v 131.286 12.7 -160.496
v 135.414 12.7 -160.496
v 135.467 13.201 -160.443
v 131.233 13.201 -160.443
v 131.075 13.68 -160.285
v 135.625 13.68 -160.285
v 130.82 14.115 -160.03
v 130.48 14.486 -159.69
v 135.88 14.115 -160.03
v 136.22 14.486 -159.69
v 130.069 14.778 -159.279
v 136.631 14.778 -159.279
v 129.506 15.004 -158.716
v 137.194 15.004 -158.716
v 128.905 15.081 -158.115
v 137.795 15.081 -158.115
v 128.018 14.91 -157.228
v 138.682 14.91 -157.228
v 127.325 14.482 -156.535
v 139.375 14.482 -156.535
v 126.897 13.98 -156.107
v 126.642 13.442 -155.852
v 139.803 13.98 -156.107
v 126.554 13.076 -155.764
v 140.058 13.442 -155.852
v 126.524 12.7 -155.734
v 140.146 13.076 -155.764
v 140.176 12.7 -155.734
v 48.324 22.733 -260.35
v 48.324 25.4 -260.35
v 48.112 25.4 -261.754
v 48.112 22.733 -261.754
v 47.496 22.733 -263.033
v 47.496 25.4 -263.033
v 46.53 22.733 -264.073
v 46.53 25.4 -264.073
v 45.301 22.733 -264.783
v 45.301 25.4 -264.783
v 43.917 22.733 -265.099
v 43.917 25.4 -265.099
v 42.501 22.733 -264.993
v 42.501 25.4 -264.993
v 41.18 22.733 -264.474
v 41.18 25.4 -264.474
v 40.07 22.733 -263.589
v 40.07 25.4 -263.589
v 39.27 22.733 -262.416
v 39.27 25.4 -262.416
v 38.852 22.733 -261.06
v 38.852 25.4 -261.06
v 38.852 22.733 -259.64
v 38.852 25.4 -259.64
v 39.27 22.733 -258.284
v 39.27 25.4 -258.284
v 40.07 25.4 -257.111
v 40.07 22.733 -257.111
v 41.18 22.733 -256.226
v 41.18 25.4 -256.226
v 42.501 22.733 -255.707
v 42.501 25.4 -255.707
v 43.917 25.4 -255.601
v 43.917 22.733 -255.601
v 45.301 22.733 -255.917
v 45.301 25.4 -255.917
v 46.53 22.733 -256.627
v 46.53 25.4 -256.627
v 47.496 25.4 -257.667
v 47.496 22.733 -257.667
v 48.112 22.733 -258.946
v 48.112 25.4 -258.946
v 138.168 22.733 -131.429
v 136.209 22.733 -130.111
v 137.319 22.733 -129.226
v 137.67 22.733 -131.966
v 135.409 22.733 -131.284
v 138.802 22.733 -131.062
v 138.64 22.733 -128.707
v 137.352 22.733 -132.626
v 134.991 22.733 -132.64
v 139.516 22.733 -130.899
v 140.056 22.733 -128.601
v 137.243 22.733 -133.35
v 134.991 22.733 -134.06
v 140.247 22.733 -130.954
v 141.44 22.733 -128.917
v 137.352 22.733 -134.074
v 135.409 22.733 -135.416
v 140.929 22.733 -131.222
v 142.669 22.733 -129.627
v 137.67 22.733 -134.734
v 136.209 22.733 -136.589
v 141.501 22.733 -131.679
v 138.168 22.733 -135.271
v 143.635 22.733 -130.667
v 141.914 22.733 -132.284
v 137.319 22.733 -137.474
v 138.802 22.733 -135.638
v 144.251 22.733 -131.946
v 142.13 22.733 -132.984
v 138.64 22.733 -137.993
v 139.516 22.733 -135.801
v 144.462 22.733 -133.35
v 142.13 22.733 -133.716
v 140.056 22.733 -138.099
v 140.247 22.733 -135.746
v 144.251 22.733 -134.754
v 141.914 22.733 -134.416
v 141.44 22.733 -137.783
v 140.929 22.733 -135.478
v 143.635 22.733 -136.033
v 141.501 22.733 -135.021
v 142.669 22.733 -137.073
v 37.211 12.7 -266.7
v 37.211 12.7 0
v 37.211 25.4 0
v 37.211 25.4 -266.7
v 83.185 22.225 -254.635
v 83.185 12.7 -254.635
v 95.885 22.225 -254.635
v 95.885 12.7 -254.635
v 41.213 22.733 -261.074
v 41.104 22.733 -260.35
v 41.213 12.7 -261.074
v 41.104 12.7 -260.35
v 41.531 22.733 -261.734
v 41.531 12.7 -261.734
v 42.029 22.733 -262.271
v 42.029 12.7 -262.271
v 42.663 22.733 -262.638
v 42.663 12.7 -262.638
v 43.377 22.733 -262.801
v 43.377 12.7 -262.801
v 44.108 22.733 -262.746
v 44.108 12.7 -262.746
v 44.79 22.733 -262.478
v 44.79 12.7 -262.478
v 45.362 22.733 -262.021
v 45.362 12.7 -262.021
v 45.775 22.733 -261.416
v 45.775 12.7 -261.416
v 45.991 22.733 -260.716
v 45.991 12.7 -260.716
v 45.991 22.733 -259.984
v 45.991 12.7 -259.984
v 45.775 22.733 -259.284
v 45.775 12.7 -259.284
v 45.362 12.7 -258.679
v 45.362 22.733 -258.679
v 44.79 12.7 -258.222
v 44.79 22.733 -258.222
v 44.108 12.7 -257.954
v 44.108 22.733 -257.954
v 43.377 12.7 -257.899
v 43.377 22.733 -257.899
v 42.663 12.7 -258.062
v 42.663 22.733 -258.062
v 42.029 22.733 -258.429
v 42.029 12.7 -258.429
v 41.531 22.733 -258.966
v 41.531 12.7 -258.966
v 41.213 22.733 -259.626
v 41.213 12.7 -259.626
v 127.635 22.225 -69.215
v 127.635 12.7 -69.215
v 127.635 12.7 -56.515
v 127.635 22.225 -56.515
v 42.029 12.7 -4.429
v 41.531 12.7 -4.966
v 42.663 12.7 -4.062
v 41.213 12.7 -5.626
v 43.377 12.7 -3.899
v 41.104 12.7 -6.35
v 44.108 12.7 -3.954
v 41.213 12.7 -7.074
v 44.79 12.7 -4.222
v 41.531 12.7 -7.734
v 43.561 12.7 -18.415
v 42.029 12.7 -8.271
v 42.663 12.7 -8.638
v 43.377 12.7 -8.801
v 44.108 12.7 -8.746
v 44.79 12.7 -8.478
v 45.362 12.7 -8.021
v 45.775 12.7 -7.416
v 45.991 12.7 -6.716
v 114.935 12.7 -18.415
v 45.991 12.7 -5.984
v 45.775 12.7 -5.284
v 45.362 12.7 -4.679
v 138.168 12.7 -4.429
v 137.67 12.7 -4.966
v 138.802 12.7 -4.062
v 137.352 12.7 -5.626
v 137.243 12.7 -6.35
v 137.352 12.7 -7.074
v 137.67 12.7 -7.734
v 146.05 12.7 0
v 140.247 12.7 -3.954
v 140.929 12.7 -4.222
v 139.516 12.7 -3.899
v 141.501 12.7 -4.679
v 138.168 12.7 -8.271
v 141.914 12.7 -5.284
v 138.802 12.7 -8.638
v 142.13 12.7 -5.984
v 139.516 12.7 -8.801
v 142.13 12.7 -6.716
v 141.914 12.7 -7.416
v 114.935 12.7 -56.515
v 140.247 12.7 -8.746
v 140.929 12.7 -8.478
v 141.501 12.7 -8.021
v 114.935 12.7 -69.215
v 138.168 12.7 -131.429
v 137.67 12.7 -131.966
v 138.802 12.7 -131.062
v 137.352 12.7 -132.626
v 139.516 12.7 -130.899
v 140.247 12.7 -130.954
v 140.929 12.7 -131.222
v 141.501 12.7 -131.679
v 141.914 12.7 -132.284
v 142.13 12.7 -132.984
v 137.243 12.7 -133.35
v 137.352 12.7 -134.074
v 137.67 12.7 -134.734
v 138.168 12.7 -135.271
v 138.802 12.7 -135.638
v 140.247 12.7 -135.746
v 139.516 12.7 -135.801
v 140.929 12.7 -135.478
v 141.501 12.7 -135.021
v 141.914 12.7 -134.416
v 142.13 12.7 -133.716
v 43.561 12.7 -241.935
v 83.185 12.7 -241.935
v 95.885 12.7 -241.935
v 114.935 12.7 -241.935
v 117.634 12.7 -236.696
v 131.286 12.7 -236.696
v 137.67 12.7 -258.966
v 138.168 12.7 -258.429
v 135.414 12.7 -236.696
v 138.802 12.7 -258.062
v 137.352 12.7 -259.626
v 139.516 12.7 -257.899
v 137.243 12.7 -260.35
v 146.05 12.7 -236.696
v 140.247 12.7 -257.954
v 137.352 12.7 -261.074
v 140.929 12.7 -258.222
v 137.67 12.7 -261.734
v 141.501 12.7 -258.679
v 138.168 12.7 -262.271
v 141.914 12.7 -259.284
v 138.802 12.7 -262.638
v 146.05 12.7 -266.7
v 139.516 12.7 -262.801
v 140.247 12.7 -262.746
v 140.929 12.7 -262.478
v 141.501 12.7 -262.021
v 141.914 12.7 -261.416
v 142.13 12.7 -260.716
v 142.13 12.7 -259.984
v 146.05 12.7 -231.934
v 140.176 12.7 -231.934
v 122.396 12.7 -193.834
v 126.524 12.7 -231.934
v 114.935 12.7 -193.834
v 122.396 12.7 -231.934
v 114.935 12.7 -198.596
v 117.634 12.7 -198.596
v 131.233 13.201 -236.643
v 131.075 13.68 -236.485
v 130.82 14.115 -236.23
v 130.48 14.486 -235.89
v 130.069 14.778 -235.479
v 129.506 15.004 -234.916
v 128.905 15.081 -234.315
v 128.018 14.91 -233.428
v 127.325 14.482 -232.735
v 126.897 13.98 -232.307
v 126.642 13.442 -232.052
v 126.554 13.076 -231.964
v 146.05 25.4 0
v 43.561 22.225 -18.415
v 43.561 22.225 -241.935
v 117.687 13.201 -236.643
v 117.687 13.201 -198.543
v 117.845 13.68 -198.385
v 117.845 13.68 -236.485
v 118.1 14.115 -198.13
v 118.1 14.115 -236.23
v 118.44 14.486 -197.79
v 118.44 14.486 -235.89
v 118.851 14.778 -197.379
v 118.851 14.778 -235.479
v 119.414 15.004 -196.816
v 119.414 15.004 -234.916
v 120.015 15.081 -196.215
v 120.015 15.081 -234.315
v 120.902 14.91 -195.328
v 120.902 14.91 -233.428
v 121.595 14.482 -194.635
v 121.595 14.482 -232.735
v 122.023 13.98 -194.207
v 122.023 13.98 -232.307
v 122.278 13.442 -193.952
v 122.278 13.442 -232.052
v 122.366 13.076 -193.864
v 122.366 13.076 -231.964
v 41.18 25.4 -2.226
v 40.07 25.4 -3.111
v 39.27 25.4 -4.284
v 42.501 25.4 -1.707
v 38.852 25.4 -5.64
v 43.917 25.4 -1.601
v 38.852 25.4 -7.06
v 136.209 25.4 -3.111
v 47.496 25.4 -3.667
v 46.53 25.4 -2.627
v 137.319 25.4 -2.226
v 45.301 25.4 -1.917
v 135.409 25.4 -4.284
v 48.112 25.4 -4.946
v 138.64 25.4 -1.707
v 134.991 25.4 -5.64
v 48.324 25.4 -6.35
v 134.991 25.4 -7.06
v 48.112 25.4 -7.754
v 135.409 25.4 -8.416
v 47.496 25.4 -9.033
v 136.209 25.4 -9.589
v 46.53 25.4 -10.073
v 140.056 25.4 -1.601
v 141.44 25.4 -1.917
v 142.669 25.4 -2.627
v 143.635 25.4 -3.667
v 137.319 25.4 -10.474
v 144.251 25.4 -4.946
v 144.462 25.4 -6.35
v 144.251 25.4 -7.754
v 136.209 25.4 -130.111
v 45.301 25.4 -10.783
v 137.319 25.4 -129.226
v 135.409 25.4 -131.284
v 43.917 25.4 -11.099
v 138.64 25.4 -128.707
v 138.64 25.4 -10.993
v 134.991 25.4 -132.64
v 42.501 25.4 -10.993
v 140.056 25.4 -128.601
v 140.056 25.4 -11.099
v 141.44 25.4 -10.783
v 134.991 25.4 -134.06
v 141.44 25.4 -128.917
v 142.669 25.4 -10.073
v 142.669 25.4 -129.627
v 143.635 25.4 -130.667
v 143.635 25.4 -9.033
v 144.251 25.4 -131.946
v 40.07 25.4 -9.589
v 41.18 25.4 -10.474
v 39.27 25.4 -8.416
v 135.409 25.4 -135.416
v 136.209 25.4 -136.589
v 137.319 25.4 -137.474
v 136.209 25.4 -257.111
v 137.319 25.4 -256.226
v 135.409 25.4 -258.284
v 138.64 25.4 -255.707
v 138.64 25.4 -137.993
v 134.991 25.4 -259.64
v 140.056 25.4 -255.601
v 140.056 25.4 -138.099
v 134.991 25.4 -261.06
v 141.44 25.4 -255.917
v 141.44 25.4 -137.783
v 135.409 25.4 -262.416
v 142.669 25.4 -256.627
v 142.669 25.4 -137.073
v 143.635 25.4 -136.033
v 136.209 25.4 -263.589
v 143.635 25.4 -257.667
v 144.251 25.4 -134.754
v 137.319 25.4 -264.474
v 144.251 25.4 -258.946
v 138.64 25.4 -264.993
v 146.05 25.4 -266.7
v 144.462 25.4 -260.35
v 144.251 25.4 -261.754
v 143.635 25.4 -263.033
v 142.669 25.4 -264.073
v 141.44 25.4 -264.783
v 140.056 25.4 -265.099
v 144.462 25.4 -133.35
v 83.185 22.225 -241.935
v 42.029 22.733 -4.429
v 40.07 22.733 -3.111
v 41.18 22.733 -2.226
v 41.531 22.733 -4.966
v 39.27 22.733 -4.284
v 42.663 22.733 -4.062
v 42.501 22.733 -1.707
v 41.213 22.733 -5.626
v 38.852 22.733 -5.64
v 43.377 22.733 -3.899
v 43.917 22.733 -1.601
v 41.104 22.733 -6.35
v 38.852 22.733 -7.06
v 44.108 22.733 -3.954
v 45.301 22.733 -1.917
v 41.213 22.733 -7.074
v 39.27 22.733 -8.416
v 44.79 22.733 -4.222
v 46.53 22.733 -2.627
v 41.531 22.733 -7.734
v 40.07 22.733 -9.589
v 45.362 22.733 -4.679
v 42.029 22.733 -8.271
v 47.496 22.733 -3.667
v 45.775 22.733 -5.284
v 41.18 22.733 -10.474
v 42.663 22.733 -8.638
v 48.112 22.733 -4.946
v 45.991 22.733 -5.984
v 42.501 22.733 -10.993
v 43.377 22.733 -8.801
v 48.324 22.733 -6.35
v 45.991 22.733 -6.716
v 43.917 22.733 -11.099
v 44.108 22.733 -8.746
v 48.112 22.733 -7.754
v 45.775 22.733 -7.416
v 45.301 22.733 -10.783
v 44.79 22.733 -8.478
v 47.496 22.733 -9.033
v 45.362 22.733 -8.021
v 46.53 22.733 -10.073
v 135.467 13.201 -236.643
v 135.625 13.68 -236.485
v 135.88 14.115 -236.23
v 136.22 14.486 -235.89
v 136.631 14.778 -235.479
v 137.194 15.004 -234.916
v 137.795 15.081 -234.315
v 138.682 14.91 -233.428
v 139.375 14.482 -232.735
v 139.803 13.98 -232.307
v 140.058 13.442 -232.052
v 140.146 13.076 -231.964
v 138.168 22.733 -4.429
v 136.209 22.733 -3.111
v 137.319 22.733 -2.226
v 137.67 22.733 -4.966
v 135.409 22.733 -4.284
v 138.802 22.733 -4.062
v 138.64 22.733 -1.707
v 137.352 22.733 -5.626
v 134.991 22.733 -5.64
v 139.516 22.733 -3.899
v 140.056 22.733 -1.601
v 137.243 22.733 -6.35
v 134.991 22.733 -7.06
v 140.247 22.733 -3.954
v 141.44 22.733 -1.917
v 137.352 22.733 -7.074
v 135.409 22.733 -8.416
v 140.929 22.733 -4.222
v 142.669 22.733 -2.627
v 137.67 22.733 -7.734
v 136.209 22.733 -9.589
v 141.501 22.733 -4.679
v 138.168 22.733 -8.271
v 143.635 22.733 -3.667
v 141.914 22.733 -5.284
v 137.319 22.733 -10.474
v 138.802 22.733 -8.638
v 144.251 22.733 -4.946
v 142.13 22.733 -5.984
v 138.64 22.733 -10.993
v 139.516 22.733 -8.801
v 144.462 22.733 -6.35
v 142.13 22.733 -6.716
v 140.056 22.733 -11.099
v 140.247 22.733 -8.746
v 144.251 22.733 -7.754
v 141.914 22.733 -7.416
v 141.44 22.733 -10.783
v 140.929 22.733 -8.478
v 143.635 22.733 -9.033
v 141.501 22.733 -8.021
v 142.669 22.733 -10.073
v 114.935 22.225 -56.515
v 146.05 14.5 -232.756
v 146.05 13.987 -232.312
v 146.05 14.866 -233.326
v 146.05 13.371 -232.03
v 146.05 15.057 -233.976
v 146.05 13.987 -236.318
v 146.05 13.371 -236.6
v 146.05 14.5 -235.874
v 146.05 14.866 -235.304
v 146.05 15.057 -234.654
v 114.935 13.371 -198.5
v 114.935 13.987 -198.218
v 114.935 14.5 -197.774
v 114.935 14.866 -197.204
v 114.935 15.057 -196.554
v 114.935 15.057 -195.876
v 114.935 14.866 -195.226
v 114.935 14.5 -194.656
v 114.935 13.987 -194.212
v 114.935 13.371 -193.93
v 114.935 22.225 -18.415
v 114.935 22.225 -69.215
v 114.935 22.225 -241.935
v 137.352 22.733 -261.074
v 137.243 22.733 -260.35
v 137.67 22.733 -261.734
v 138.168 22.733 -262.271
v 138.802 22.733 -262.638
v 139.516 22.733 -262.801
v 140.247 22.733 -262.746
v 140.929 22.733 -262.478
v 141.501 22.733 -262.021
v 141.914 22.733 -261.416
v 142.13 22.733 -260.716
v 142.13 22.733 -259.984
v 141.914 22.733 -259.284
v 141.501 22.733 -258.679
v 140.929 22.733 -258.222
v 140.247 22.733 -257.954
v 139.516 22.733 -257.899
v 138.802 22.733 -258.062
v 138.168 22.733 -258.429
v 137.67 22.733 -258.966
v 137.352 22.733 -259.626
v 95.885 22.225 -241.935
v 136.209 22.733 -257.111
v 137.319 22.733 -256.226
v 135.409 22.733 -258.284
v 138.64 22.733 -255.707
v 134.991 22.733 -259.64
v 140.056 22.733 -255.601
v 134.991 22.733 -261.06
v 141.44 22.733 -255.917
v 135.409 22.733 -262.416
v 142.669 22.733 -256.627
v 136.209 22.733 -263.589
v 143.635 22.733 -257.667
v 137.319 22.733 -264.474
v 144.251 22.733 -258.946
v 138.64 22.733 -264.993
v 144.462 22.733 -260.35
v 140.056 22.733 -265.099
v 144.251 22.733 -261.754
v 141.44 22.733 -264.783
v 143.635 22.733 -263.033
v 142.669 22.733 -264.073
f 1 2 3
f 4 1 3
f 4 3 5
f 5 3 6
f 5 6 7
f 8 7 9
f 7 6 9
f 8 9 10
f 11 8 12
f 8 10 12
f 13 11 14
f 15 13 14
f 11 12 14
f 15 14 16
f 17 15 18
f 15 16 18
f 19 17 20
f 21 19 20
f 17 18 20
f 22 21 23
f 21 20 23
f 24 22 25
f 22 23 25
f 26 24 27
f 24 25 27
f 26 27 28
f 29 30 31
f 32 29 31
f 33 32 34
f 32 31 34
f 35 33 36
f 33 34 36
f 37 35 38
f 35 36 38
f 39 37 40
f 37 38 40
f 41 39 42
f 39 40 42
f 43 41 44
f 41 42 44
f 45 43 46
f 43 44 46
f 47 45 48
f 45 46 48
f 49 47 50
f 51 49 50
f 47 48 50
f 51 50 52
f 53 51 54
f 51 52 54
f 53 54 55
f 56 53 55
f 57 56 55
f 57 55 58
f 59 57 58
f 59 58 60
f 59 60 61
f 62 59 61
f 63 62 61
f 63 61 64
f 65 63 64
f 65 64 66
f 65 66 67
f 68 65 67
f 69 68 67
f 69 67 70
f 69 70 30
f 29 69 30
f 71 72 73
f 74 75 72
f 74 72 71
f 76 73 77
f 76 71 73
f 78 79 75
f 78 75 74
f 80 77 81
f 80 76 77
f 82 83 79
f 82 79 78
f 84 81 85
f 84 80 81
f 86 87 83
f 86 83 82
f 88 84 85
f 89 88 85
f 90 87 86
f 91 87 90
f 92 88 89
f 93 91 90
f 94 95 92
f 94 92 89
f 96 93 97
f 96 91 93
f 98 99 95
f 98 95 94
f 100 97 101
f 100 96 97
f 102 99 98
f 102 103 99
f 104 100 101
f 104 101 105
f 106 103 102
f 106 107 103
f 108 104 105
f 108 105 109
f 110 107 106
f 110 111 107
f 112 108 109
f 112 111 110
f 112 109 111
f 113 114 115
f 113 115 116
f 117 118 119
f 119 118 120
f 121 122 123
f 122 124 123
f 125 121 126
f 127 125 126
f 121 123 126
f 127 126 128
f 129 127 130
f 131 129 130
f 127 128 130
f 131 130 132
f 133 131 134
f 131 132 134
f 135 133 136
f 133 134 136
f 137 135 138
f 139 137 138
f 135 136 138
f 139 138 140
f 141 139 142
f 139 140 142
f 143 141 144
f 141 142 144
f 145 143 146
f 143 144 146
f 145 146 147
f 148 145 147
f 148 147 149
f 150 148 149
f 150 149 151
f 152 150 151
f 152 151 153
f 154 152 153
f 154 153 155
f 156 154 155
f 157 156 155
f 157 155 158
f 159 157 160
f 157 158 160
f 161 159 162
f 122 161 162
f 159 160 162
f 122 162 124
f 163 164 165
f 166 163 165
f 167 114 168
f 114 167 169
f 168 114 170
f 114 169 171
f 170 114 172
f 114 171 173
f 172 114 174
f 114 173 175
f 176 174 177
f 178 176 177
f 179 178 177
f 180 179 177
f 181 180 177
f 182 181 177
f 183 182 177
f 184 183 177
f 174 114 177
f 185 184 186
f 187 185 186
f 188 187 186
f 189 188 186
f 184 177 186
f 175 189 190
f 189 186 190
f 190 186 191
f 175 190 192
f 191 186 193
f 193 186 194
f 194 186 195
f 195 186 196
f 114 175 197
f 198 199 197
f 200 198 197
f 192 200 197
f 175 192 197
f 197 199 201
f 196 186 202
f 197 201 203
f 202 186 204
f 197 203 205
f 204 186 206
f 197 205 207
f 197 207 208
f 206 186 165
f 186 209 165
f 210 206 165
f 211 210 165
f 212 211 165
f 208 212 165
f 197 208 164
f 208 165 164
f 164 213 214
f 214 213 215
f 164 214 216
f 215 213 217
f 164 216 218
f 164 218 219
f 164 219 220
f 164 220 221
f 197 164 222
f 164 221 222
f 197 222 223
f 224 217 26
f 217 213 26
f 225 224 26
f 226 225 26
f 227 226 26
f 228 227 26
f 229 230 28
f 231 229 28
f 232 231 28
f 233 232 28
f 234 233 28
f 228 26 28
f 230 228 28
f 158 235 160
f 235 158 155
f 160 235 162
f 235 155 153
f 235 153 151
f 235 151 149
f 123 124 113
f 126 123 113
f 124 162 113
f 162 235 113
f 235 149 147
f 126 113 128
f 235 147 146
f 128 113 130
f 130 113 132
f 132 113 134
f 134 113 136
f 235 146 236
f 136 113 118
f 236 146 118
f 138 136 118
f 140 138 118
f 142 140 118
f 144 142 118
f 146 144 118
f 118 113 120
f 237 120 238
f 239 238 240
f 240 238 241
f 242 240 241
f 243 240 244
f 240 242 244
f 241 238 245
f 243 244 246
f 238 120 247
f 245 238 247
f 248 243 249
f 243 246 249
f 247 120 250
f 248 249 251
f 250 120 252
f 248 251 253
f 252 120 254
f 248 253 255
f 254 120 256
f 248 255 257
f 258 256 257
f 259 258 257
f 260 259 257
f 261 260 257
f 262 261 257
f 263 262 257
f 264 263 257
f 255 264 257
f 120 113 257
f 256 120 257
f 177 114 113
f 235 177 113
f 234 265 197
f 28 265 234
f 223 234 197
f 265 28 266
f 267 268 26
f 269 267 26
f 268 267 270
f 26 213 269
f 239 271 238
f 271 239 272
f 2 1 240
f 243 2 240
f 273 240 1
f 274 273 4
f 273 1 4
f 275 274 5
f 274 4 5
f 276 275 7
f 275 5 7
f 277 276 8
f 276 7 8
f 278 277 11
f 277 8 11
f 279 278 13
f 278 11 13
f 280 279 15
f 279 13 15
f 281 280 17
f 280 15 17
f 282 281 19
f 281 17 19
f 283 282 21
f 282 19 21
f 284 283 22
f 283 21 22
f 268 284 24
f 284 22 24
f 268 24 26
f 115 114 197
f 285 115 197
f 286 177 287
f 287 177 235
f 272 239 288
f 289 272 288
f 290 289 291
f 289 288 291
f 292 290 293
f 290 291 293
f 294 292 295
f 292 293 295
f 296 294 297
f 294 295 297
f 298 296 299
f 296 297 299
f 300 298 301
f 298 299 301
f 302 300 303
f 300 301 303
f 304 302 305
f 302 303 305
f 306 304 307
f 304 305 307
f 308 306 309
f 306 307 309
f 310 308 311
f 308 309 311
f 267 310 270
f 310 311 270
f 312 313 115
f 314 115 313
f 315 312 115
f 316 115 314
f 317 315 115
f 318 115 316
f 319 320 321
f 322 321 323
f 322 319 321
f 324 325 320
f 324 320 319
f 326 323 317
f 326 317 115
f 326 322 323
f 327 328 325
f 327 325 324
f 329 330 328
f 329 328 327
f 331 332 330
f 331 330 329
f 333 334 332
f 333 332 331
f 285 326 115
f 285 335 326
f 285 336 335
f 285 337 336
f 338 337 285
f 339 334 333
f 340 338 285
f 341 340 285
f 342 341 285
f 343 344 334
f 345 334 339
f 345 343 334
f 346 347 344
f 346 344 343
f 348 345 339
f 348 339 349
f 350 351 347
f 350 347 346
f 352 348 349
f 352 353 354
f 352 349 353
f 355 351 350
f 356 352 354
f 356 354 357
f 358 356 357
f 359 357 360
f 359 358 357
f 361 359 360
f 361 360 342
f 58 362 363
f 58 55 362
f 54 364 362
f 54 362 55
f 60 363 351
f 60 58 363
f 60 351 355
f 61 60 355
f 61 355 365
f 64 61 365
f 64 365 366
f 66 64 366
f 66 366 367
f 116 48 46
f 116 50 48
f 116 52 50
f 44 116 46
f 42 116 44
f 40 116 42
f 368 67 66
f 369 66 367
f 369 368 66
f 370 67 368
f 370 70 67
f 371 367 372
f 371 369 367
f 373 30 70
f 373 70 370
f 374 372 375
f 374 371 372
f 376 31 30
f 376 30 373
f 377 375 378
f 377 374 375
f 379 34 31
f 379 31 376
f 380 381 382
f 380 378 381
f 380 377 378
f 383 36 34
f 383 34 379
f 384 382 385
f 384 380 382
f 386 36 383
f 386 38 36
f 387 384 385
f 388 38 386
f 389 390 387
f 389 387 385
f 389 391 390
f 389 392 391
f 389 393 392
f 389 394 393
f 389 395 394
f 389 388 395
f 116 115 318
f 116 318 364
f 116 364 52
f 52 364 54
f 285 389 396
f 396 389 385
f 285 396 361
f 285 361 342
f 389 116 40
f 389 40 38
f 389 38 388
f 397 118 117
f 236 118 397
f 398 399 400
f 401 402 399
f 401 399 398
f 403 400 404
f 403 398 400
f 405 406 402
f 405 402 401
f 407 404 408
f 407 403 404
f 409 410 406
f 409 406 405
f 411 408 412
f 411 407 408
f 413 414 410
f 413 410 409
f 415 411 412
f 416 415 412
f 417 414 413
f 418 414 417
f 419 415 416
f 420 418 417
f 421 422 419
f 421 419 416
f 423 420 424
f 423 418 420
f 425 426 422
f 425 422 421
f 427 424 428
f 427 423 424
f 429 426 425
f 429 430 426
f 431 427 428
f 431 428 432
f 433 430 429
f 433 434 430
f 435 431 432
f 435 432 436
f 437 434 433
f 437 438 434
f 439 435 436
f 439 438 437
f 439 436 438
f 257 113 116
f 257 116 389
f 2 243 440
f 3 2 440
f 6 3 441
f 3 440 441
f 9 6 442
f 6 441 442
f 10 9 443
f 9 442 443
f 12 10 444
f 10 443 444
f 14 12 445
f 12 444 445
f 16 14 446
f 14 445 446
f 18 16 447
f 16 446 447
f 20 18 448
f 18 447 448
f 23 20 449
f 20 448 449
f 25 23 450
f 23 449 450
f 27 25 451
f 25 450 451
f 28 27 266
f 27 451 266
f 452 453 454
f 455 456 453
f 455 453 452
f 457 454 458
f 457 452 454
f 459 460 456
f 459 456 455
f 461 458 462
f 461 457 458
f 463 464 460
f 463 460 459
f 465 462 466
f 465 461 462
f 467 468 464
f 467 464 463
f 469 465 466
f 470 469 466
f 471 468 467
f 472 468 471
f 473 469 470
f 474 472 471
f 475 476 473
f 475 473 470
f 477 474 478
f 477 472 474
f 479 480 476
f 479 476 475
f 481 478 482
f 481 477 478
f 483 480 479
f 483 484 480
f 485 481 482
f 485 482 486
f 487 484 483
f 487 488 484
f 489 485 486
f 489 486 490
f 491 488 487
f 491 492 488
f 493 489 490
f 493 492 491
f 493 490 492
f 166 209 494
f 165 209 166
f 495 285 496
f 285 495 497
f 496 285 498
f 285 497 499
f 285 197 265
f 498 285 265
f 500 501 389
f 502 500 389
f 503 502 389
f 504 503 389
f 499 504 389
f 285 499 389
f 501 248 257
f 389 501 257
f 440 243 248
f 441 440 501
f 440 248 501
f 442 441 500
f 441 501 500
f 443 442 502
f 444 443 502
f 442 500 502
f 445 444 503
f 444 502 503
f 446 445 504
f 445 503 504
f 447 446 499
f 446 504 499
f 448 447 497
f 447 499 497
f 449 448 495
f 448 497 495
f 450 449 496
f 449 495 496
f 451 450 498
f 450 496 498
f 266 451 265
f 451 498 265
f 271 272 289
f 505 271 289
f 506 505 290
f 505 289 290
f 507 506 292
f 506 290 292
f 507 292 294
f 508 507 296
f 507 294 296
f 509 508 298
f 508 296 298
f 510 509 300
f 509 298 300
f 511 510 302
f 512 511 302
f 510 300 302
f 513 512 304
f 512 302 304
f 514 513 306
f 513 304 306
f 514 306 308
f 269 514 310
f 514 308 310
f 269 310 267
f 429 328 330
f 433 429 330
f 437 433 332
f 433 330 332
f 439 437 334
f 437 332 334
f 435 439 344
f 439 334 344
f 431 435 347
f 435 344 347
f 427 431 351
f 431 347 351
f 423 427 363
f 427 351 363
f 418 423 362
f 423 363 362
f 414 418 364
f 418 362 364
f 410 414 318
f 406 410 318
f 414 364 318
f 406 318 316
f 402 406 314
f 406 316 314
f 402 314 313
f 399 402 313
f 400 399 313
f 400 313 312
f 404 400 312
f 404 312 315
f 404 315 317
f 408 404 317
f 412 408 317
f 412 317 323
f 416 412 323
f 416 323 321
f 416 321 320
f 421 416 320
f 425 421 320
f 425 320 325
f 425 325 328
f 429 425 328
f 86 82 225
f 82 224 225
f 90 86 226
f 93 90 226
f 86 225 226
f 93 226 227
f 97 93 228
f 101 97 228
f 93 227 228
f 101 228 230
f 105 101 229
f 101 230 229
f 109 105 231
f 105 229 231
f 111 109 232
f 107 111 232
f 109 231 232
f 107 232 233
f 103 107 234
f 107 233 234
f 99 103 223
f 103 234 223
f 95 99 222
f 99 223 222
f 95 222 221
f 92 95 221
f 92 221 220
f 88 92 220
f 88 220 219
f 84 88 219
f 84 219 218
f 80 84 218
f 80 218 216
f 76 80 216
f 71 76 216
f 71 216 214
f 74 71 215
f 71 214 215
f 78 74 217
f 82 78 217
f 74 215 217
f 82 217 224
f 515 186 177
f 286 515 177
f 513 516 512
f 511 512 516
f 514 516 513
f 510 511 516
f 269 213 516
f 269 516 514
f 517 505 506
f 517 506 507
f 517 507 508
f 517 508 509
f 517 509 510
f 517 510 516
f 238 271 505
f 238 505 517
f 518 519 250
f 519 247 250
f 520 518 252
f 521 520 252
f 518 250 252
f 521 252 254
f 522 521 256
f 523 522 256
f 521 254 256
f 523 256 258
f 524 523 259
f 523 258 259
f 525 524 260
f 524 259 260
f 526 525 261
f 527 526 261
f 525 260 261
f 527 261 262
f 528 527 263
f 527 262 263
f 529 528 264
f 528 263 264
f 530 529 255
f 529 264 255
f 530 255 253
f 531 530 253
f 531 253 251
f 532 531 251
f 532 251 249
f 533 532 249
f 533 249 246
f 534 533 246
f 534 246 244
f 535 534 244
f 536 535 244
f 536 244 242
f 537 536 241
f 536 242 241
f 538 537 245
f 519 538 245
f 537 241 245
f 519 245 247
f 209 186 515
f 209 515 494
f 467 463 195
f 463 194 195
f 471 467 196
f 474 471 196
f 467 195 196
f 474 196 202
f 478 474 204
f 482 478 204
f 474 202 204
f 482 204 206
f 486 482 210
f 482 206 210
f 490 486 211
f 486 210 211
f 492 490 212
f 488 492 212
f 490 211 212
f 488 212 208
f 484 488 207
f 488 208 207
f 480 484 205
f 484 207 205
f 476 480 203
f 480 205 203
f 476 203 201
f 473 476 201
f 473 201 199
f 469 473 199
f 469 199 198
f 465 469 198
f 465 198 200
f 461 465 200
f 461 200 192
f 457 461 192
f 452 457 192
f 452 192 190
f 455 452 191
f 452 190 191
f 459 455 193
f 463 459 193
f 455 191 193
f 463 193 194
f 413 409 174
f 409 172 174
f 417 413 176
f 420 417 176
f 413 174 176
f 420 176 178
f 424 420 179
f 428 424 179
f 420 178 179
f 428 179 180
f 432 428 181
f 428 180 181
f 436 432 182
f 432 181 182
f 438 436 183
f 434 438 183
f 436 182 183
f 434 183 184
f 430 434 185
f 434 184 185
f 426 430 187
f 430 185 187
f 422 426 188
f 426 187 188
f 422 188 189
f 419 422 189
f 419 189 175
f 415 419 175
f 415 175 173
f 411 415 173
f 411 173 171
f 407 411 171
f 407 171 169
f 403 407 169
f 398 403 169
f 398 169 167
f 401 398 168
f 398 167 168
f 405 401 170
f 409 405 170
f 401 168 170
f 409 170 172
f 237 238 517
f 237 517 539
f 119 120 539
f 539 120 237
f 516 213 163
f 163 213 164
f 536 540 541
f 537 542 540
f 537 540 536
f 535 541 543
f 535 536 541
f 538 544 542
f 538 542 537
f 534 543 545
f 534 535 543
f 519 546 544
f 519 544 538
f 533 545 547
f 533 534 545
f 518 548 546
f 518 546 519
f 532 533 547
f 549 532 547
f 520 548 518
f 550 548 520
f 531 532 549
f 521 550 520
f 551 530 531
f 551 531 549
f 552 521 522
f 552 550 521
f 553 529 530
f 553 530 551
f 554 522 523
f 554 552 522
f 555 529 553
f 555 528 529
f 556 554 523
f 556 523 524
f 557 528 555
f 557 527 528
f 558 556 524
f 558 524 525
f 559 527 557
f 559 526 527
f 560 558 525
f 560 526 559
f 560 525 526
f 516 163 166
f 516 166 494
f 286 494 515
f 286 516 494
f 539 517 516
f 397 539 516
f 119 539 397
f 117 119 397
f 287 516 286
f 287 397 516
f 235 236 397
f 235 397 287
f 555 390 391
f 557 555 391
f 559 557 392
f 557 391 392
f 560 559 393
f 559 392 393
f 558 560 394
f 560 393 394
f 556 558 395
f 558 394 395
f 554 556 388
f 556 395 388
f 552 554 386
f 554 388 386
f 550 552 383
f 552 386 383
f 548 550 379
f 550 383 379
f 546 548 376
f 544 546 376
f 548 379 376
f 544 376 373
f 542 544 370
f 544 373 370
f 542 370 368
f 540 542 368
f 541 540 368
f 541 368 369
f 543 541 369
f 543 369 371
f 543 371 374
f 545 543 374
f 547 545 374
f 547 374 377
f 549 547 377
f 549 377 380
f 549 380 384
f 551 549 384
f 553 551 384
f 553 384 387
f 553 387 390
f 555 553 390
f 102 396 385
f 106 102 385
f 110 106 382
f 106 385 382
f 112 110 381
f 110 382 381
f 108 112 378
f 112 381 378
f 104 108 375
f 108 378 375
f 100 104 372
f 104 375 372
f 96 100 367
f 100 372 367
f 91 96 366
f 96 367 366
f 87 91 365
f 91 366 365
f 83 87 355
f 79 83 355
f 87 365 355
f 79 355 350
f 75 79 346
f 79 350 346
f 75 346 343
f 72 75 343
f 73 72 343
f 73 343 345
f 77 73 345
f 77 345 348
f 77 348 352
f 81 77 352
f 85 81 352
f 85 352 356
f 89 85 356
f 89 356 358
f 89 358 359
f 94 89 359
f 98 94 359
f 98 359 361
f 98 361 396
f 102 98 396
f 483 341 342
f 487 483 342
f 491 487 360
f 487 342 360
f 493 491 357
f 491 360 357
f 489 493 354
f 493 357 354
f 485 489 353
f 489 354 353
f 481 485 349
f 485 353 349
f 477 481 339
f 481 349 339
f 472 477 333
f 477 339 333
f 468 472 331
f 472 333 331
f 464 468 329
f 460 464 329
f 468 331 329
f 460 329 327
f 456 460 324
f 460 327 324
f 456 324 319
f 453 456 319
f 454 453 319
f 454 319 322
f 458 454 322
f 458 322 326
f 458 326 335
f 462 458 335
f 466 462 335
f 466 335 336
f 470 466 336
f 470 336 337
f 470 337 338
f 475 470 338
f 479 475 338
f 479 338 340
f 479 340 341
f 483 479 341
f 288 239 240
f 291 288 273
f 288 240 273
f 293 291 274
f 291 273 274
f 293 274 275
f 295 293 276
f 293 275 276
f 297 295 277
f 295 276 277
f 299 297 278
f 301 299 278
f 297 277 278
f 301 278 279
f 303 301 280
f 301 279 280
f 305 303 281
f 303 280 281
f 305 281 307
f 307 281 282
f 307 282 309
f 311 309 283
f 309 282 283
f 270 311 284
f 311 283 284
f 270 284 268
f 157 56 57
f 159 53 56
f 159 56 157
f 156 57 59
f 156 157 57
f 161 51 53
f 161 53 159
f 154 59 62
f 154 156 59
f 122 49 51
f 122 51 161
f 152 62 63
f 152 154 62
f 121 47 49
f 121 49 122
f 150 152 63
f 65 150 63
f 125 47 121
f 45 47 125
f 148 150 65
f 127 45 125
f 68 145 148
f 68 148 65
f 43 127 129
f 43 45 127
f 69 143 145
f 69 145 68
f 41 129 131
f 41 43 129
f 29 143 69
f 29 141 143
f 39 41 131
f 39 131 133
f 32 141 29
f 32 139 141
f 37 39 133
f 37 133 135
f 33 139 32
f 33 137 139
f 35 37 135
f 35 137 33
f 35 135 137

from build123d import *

# Parameters (mm, degrees)
BOSS_EXTRUDE1_START                                 = 12.7
SKETCH1_W                                           = 108.839
SKETCH1_H                                           = 266.7
BOSS_EXTRUDE1_DEPTH                                 = 12.7
CBORE_FOR_8_BINDING_HEAD_MACHINE_SCREW1_D           = 4.9149
CBORE_FOR_8_BINDING_HEAD_MACHINE_SCREW1_CBORE_D     = 9.525
CBORE_FOR_8_BINDING_HEAD_MACHINE_SCREW1_CBORE_DEPTH = 2.667
SKETCH4_W                                           = 71.374
SKETCH4_H                                           = 223.52
CUT_EXTRUDE1_DEPTH                                  = 9.525
SKETCH6_R                                           = 2.38125
SKETCH8_W                                           = 12.7
SKETCH8_H                                           = 12.7
CUT_EXTRUDE3_DEPTH                                  = 9.525


with BuildPart() as part:
    # Sketch1 → Boss-Extrude1 (new body)
    with BuildSketch(Plane(origin=(0, 0, 0), x_dir=(1, 0, 0), z_dir=(0, 1, 0)).offset(BOSS_EXTRUDE1_START)):
        with Locations((91.6305, 133.35)):
            Rectangle(SKETCH1_W, SKETCH1_H)
    extrude(amount=BOSS_EXTRUDE1_DEPTH)

    # CBORE for #8 Binding Head Machine Screw1 (through all)
    with Locations(Plane(origin=(0, 25.4, 0), x_dir=(1, 0, 0), z_dir=(0, 1, 0))):
        with Locations((139.7, 6.35), (139.7, 260.35), (43.561, 6.35), (43.561, 260.35), (139.7, 133.35)):
            CounterBoreHole(CBORE_FOR_8_BINDING_HEAD_MACHINE_SCREW1_D / 2, CBORE_FOR_8_BINDING_HEAD_MACHINE_SCREW1_CBORE_D / 2, CBORE_FOR_8_BINDING_HEAD_MACHINE_SCREW1_CBORE_DEPTH)

    # Sketch4 → Cut-Extrude1 (cut)
    with BuildSketch(Plane(origin=(0, 12.7, 0), x_dir=(-1, 0, 0), z_dir=(0, -1, 0))):
        with Locations((-79.248, 130.175)):
            Rectangle(SKETCH4_W, SKETCH4_H)
    extrude(amount=-CUT_EXTRUDE1_DEPTH, mode=Mode.SUBTRACT)

    # Cut-Sweep1: sweep along a path in Sketch5
    with BuildLine(Plane.XZ.offset(-12.7)) as cut_sweep1_path:
        Line((114.935, -196.215), (120.015, -196.215))
        Line((120.015, -196.215), (120.015, -234.315))
        Line((120.015, -234.315), (128.905, -234.315))
        Line((128.905, -234.315), (128.905, -158.115))
        Line((128.905, -158.115), (137.795, -158.115))
        Line((137.795, -158.115), (137.795, -234.315))
        Line((137.795, -234.315), (146.05, -234.315))
    # Sketch6 → Cut-Sweep1 (sweep, cut)
    with BuildSketch(Plane(origin=(146.05, 0, 0), x_dir=(0, 0, -1), z_dir=(1, 0, 0))):
        with Locations((234.315, 12.7)):
            Circle(SKETCH6_R)
    sweep(path=cut_sweep1_path.line, transition=Transition.RIGHT, mode=Mode.SUBTRACT)

    # Sketch8 → Cut-Extrude3 (cut)
    with BuildSketch(Plane.XZ.offset(-12.7)):
        with Locations((121.285, -62.865)):
            Rectangle(SKETCH8_W, SKETCH8_H)
        with Locations((89.535, -248.285)):
            Rectangle(SKETCH8_W, SKETCH8_H)
    extrude(amount=-CUT_EXTRUDE3_DEPTH, mode=Mode.SUBTRACT)


solid = part.part
